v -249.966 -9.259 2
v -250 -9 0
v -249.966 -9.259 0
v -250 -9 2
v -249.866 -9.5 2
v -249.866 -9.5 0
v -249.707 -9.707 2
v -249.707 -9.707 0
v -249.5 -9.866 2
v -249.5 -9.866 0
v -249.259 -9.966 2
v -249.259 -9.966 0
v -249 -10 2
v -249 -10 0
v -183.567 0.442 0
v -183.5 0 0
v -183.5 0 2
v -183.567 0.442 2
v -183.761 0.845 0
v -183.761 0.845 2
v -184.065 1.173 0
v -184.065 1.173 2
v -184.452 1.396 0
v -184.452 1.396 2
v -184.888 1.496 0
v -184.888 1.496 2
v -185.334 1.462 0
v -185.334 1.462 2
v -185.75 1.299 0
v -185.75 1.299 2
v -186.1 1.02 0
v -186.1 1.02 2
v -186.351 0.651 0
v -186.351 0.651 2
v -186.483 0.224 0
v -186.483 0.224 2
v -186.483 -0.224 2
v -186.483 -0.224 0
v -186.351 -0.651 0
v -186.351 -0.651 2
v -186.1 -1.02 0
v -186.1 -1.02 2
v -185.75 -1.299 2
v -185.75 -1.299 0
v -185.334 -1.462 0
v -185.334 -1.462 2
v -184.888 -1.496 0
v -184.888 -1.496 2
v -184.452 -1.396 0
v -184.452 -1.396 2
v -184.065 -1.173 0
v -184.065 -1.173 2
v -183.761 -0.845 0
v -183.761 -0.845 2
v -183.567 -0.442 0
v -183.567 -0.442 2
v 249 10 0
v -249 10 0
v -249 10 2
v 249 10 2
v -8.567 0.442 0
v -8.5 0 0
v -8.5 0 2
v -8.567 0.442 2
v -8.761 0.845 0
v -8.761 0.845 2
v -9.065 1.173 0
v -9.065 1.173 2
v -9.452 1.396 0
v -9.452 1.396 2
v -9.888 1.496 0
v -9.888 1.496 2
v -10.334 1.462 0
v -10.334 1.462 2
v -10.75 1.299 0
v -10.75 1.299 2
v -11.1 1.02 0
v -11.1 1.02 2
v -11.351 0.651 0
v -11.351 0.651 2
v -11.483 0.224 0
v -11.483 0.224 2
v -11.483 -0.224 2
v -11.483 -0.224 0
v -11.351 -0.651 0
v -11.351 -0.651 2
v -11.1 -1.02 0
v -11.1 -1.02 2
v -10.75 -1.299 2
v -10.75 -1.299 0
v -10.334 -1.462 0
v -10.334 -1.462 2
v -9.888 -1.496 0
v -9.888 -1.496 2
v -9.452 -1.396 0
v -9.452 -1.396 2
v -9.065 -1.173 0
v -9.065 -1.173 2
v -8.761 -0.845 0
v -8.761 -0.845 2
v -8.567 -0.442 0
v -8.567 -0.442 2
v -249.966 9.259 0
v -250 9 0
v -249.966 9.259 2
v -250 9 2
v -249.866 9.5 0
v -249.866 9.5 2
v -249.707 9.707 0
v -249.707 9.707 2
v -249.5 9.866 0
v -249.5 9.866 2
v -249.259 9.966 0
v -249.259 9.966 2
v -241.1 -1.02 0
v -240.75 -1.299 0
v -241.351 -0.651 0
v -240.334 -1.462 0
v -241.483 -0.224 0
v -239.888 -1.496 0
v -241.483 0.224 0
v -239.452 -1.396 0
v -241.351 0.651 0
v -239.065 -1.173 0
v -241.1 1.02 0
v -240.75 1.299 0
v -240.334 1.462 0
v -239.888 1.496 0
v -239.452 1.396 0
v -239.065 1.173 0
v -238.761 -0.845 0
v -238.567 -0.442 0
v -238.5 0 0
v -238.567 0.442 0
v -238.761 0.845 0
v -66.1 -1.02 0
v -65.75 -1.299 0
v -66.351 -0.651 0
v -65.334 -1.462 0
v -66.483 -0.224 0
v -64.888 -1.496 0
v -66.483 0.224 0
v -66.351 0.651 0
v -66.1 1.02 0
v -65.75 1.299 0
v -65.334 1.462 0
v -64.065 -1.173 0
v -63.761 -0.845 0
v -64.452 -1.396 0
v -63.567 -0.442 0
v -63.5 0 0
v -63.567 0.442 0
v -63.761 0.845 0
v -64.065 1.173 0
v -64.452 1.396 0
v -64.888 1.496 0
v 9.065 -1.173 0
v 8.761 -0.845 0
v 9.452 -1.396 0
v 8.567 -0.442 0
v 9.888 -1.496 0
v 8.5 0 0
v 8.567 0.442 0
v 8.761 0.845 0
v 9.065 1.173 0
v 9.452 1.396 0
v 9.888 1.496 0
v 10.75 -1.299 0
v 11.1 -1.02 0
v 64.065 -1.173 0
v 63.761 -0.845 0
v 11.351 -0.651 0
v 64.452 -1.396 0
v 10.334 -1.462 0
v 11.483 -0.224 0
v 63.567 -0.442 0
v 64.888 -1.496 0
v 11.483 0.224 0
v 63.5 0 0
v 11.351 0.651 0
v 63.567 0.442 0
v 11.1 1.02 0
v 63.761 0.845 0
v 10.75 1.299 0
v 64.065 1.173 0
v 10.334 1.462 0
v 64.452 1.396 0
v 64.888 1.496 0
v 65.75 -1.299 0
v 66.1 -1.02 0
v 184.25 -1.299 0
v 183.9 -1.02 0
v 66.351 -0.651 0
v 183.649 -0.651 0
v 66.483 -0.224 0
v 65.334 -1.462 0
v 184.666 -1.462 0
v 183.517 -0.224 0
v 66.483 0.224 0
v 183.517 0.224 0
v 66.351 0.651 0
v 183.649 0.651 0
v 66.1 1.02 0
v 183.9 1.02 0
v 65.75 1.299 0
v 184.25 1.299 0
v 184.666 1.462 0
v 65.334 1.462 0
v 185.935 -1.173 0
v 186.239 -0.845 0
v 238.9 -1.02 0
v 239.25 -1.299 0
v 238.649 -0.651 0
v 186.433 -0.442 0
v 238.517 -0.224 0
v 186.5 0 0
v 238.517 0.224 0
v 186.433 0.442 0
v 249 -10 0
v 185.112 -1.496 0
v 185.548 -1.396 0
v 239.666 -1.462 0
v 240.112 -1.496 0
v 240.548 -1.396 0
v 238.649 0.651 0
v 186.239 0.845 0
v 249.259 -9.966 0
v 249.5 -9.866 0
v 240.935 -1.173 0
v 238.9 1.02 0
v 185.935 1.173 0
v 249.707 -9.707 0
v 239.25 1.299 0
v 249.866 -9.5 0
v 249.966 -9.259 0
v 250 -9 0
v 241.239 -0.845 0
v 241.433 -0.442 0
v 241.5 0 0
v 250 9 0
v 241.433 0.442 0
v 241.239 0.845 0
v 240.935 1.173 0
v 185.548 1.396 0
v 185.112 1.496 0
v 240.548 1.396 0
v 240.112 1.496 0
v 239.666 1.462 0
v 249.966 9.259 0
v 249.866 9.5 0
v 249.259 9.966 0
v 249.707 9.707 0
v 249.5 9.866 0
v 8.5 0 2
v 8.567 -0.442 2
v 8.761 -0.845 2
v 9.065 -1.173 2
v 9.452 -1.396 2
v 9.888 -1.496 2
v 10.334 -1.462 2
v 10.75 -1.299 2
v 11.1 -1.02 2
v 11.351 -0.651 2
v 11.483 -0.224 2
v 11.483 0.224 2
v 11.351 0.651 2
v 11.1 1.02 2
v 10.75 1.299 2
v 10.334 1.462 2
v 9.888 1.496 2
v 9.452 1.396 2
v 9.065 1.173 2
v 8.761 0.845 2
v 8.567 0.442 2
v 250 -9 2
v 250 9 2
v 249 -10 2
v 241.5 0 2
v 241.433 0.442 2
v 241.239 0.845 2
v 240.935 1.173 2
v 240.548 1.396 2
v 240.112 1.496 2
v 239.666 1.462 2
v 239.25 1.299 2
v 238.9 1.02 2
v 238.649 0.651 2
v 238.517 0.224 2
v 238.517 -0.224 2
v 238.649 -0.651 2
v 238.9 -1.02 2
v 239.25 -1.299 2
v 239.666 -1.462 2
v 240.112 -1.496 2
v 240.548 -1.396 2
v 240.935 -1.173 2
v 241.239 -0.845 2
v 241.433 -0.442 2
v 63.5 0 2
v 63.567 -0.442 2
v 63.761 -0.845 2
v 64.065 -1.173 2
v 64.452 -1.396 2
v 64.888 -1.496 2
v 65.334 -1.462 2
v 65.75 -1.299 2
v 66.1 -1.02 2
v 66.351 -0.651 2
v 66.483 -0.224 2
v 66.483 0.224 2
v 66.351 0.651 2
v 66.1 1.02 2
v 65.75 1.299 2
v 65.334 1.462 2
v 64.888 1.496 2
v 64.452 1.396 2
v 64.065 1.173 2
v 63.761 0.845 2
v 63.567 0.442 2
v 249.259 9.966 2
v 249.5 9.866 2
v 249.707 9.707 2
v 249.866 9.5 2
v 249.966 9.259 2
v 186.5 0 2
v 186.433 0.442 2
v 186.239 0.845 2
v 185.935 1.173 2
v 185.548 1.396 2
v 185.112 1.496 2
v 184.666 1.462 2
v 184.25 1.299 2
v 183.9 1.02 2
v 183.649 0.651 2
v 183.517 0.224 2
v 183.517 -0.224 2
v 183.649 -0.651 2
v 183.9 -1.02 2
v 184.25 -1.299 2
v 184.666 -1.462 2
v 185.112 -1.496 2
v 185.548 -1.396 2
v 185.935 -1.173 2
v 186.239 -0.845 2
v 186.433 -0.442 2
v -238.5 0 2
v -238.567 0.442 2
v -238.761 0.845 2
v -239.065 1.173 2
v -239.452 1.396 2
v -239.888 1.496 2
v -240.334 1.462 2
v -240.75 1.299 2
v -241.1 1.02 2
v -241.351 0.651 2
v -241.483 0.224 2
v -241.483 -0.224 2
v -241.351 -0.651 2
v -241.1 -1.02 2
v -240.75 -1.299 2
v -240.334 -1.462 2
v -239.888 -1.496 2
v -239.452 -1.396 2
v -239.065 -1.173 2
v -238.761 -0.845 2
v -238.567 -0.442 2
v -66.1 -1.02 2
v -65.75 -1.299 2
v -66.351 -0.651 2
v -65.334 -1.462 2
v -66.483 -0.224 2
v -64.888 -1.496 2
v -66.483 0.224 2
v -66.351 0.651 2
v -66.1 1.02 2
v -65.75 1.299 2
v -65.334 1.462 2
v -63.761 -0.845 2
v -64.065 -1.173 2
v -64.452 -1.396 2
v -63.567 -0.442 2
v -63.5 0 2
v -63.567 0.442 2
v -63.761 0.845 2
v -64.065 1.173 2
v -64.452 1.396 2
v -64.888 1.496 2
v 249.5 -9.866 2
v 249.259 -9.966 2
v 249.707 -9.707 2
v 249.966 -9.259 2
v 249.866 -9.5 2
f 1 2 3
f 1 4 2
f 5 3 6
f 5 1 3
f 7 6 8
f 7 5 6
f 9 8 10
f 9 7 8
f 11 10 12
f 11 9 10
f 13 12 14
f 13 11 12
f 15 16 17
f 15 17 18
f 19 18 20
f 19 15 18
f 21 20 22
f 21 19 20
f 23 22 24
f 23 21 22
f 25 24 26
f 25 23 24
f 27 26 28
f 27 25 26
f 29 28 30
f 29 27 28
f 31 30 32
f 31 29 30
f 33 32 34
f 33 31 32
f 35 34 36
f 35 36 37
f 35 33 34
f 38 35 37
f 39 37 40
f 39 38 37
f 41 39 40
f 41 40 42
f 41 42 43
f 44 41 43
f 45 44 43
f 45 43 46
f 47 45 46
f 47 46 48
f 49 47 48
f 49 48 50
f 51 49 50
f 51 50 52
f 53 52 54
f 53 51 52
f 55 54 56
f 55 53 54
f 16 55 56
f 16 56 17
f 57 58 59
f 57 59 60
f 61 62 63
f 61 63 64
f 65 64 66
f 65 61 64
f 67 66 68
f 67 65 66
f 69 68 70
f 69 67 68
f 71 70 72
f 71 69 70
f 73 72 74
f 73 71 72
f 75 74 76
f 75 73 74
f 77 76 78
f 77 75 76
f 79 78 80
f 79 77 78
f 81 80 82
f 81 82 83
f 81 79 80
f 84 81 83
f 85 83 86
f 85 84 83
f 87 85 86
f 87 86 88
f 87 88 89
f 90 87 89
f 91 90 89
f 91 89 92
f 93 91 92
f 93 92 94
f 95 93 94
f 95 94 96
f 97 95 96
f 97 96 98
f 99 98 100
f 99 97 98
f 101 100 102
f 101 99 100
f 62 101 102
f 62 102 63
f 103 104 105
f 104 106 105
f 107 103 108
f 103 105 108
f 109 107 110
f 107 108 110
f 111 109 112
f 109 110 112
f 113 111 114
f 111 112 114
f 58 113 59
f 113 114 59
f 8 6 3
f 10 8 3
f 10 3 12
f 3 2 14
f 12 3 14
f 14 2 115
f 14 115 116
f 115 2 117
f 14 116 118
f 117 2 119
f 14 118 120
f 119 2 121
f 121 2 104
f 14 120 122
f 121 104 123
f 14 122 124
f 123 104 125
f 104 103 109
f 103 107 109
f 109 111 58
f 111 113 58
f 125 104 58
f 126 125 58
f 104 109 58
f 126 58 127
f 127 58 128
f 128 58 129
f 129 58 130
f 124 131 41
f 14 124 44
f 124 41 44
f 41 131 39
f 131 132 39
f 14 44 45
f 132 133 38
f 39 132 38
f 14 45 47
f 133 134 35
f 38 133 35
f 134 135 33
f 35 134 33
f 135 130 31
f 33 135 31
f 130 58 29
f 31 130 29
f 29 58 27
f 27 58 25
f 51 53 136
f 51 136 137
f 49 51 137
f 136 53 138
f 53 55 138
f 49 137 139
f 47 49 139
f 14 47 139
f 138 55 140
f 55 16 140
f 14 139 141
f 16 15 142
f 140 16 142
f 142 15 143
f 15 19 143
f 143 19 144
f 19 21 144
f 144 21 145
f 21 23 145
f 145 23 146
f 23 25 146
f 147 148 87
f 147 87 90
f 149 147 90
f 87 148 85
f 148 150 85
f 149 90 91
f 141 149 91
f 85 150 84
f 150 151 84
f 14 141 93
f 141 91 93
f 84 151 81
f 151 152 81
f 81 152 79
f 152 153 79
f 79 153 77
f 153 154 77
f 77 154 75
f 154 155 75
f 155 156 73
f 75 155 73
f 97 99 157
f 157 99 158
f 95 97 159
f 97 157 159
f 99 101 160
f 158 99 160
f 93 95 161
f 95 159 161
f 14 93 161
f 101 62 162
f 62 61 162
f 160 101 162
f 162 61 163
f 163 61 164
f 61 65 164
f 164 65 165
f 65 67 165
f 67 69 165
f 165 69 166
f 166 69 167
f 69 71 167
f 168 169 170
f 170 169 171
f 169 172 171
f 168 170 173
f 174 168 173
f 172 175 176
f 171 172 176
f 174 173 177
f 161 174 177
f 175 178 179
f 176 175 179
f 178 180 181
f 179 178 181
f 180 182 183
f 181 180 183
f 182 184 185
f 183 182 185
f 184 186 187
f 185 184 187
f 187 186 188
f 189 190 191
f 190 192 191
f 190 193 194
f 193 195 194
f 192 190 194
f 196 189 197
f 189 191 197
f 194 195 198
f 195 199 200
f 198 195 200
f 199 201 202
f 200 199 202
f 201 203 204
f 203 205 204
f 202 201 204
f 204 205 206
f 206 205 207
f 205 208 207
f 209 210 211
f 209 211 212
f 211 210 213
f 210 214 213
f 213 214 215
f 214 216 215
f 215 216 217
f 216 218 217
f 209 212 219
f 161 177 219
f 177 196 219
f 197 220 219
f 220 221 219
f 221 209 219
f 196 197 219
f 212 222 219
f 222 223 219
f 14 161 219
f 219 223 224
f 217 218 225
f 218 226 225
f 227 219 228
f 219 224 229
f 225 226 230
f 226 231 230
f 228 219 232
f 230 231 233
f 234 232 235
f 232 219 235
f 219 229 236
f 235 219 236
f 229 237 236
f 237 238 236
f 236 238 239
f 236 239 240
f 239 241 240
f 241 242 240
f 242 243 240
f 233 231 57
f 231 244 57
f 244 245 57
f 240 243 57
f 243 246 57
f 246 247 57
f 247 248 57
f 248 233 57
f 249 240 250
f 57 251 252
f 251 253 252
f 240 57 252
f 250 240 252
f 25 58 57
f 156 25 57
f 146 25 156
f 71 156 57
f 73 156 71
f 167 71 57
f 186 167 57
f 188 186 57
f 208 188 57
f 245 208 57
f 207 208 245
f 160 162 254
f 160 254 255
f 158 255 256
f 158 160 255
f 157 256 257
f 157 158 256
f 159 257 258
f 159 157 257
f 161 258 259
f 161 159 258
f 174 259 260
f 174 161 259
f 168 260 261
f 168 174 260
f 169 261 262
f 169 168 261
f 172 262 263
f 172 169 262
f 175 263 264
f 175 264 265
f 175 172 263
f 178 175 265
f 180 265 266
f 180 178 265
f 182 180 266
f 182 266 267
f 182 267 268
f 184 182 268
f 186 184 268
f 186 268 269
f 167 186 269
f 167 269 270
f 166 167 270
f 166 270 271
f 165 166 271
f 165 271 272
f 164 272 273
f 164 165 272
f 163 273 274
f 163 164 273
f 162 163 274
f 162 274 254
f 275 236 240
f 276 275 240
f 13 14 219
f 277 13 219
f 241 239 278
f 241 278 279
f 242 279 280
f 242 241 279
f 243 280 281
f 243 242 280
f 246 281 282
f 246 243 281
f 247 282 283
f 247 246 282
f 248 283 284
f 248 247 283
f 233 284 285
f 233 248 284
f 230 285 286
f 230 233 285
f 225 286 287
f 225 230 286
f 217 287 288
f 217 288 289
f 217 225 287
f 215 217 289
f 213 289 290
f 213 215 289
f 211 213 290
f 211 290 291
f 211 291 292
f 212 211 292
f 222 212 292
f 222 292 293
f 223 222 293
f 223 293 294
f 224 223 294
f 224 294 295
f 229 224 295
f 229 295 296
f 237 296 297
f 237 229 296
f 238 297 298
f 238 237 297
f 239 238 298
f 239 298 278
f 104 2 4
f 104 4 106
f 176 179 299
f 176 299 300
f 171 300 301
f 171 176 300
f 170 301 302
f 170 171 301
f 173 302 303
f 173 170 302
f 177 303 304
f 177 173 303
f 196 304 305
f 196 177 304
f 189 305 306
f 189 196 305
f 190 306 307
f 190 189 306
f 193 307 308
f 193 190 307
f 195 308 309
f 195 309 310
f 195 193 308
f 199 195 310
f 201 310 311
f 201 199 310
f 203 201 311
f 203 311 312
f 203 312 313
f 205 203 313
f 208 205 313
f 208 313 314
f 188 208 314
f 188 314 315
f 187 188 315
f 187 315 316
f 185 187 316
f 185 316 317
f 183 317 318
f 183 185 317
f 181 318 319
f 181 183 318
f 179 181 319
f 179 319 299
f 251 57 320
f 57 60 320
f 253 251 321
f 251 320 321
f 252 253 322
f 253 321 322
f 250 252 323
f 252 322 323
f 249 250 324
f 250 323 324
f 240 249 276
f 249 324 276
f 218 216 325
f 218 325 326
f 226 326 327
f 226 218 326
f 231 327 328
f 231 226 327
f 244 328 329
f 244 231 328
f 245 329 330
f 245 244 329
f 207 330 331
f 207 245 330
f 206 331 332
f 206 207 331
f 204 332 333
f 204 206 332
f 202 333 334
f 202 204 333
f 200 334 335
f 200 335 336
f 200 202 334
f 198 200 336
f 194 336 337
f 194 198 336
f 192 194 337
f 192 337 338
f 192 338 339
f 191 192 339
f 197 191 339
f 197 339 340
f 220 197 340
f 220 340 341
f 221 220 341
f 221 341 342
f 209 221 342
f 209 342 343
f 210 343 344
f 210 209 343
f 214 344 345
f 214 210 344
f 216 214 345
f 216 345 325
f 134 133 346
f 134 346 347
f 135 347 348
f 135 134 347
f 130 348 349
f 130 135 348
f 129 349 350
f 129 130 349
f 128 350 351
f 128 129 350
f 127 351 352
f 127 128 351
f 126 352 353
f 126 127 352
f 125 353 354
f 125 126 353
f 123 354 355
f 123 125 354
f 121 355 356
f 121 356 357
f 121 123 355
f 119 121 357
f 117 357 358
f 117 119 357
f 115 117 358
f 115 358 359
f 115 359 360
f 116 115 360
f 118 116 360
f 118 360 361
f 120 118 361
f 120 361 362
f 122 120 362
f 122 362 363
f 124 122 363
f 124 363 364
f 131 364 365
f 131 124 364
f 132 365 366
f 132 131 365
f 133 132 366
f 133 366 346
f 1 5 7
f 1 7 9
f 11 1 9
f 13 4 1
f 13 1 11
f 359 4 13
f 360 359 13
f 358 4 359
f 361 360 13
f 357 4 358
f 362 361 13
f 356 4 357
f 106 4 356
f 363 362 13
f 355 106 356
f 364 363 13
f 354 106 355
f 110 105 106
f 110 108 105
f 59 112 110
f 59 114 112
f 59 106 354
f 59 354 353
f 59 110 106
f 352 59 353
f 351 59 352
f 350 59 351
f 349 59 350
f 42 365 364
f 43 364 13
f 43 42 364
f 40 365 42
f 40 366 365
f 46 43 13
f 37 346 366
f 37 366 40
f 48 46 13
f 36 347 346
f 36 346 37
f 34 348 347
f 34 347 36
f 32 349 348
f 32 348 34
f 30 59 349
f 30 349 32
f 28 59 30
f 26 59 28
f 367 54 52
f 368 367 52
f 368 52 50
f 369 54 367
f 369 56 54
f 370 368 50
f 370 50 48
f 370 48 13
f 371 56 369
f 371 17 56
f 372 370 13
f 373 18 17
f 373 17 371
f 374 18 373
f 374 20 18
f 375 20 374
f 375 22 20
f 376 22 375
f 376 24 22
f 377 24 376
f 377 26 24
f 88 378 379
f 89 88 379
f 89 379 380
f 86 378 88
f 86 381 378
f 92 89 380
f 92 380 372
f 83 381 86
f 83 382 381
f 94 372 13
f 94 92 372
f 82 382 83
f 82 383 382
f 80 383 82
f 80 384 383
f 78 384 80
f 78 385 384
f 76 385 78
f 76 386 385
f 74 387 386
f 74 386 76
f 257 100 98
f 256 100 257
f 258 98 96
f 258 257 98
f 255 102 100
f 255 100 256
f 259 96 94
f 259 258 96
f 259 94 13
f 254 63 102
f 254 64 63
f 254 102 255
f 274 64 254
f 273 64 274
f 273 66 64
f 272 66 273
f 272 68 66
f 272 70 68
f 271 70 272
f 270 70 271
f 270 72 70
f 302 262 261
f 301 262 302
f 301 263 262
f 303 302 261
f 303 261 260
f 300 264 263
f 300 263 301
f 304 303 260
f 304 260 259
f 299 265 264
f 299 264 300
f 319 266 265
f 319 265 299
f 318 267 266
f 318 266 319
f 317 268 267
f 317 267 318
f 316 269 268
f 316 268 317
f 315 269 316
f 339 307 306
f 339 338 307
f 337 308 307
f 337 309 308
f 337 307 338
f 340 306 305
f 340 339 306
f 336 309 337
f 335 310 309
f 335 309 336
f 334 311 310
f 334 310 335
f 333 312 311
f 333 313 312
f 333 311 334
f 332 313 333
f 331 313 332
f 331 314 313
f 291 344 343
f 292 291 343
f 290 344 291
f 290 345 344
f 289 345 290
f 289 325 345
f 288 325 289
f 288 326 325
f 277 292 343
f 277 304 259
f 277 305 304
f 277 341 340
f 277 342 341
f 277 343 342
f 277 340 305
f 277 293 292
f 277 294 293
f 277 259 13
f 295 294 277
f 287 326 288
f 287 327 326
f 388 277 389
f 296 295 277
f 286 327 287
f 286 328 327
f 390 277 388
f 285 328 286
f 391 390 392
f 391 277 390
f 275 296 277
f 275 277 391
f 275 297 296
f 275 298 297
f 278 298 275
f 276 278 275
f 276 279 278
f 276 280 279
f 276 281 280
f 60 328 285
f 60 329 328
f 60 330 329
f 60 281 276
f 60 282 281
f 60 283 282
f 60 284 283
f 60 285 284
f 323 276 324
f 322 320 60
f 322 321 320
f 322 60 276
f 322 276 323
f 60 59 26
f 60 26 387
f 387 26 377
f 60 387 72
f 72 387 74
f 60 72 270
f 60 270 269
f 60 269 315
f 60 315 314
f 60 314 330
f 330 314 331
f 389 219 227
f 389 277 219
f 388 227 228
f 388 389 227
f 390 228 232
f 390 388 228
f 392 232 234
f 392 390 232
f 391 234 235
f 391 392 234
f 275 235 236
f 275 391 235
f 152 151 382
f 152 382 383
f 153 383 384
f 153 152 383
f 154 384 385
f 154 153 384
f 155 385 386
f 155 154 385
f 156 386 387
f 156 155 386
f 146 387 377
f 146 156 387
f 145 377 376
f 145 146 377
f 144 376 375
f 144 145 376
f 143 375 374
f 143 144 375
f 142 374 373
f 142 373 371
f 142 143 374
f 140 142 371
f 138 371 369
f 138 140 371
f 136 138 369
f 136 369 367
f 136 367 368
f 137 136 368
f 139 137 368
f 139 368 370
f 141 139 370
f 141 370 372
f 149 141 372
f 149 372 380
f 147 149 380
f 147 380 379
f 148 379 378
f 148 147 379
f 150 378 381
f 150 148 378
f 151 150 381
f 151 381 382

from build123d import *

# Parameters (mm, degrees)
SKETCH_1_W      = 500
SKETCH_1_H      = 20
SKETCH_1_R      = 1.5
EXTRUDE_1_DEPTH = 2
FILLET_1_R      = 1


with BuildPart() as part:
    # 草图1 → 凸台-拉伸1 (new body)
    with BuildSketch(Plane.XY):
        Rectangle(SKETCH_1_W, SKETCH_1_H)
        with Locations((240, 0)):
            Circle(SKETCH_1_R, mode=Mode.SUBTRACT)
        with Locations((185, 0)):
            Circle(SKETCH_1_R, mode=Mode.SUBTRACT)
        with Locations((-240, 0)):
            Circle(SKETCH_1_R, mode=Mode.SUBTRACT)
        with Locations((-185, 0)):
            Circle(SKETCH_1_R, mode=Mode.SUBTRACT)
        with Locations((-10, 0)):
            Circle(SKETCH_1_R, mode=Mode.SUBTRACT)
        with Locations((-65, 0)):
            Circle(SKETCH_1_R, mode=Mode.SUBTRACT)
        with Locations(Location((10, 0, 0), (0, 0, 180))):
            Circle(SKETCH_1_R, mode=Mode.SUBTRACT)
        with Locations(Location((65, 0, 0), (0, 0, 180))):
            Circle(SKETCH_1_R, mode=Mode.SUBTRACT)
    extrude(amount=EXTRUDE_1_DEPTH)

    # 圆角1
    fillet_1_edges = [part.edges().sort_by_distance(p)[0] for p in [
        (250, -10, 1),
        (-250, -10, 1),
        (-250, 10, 1),
        (250, 10, 1),
    ]]
    fillet(fillet_1_edges, radius=FILLET_1_R)


solid = part.part
